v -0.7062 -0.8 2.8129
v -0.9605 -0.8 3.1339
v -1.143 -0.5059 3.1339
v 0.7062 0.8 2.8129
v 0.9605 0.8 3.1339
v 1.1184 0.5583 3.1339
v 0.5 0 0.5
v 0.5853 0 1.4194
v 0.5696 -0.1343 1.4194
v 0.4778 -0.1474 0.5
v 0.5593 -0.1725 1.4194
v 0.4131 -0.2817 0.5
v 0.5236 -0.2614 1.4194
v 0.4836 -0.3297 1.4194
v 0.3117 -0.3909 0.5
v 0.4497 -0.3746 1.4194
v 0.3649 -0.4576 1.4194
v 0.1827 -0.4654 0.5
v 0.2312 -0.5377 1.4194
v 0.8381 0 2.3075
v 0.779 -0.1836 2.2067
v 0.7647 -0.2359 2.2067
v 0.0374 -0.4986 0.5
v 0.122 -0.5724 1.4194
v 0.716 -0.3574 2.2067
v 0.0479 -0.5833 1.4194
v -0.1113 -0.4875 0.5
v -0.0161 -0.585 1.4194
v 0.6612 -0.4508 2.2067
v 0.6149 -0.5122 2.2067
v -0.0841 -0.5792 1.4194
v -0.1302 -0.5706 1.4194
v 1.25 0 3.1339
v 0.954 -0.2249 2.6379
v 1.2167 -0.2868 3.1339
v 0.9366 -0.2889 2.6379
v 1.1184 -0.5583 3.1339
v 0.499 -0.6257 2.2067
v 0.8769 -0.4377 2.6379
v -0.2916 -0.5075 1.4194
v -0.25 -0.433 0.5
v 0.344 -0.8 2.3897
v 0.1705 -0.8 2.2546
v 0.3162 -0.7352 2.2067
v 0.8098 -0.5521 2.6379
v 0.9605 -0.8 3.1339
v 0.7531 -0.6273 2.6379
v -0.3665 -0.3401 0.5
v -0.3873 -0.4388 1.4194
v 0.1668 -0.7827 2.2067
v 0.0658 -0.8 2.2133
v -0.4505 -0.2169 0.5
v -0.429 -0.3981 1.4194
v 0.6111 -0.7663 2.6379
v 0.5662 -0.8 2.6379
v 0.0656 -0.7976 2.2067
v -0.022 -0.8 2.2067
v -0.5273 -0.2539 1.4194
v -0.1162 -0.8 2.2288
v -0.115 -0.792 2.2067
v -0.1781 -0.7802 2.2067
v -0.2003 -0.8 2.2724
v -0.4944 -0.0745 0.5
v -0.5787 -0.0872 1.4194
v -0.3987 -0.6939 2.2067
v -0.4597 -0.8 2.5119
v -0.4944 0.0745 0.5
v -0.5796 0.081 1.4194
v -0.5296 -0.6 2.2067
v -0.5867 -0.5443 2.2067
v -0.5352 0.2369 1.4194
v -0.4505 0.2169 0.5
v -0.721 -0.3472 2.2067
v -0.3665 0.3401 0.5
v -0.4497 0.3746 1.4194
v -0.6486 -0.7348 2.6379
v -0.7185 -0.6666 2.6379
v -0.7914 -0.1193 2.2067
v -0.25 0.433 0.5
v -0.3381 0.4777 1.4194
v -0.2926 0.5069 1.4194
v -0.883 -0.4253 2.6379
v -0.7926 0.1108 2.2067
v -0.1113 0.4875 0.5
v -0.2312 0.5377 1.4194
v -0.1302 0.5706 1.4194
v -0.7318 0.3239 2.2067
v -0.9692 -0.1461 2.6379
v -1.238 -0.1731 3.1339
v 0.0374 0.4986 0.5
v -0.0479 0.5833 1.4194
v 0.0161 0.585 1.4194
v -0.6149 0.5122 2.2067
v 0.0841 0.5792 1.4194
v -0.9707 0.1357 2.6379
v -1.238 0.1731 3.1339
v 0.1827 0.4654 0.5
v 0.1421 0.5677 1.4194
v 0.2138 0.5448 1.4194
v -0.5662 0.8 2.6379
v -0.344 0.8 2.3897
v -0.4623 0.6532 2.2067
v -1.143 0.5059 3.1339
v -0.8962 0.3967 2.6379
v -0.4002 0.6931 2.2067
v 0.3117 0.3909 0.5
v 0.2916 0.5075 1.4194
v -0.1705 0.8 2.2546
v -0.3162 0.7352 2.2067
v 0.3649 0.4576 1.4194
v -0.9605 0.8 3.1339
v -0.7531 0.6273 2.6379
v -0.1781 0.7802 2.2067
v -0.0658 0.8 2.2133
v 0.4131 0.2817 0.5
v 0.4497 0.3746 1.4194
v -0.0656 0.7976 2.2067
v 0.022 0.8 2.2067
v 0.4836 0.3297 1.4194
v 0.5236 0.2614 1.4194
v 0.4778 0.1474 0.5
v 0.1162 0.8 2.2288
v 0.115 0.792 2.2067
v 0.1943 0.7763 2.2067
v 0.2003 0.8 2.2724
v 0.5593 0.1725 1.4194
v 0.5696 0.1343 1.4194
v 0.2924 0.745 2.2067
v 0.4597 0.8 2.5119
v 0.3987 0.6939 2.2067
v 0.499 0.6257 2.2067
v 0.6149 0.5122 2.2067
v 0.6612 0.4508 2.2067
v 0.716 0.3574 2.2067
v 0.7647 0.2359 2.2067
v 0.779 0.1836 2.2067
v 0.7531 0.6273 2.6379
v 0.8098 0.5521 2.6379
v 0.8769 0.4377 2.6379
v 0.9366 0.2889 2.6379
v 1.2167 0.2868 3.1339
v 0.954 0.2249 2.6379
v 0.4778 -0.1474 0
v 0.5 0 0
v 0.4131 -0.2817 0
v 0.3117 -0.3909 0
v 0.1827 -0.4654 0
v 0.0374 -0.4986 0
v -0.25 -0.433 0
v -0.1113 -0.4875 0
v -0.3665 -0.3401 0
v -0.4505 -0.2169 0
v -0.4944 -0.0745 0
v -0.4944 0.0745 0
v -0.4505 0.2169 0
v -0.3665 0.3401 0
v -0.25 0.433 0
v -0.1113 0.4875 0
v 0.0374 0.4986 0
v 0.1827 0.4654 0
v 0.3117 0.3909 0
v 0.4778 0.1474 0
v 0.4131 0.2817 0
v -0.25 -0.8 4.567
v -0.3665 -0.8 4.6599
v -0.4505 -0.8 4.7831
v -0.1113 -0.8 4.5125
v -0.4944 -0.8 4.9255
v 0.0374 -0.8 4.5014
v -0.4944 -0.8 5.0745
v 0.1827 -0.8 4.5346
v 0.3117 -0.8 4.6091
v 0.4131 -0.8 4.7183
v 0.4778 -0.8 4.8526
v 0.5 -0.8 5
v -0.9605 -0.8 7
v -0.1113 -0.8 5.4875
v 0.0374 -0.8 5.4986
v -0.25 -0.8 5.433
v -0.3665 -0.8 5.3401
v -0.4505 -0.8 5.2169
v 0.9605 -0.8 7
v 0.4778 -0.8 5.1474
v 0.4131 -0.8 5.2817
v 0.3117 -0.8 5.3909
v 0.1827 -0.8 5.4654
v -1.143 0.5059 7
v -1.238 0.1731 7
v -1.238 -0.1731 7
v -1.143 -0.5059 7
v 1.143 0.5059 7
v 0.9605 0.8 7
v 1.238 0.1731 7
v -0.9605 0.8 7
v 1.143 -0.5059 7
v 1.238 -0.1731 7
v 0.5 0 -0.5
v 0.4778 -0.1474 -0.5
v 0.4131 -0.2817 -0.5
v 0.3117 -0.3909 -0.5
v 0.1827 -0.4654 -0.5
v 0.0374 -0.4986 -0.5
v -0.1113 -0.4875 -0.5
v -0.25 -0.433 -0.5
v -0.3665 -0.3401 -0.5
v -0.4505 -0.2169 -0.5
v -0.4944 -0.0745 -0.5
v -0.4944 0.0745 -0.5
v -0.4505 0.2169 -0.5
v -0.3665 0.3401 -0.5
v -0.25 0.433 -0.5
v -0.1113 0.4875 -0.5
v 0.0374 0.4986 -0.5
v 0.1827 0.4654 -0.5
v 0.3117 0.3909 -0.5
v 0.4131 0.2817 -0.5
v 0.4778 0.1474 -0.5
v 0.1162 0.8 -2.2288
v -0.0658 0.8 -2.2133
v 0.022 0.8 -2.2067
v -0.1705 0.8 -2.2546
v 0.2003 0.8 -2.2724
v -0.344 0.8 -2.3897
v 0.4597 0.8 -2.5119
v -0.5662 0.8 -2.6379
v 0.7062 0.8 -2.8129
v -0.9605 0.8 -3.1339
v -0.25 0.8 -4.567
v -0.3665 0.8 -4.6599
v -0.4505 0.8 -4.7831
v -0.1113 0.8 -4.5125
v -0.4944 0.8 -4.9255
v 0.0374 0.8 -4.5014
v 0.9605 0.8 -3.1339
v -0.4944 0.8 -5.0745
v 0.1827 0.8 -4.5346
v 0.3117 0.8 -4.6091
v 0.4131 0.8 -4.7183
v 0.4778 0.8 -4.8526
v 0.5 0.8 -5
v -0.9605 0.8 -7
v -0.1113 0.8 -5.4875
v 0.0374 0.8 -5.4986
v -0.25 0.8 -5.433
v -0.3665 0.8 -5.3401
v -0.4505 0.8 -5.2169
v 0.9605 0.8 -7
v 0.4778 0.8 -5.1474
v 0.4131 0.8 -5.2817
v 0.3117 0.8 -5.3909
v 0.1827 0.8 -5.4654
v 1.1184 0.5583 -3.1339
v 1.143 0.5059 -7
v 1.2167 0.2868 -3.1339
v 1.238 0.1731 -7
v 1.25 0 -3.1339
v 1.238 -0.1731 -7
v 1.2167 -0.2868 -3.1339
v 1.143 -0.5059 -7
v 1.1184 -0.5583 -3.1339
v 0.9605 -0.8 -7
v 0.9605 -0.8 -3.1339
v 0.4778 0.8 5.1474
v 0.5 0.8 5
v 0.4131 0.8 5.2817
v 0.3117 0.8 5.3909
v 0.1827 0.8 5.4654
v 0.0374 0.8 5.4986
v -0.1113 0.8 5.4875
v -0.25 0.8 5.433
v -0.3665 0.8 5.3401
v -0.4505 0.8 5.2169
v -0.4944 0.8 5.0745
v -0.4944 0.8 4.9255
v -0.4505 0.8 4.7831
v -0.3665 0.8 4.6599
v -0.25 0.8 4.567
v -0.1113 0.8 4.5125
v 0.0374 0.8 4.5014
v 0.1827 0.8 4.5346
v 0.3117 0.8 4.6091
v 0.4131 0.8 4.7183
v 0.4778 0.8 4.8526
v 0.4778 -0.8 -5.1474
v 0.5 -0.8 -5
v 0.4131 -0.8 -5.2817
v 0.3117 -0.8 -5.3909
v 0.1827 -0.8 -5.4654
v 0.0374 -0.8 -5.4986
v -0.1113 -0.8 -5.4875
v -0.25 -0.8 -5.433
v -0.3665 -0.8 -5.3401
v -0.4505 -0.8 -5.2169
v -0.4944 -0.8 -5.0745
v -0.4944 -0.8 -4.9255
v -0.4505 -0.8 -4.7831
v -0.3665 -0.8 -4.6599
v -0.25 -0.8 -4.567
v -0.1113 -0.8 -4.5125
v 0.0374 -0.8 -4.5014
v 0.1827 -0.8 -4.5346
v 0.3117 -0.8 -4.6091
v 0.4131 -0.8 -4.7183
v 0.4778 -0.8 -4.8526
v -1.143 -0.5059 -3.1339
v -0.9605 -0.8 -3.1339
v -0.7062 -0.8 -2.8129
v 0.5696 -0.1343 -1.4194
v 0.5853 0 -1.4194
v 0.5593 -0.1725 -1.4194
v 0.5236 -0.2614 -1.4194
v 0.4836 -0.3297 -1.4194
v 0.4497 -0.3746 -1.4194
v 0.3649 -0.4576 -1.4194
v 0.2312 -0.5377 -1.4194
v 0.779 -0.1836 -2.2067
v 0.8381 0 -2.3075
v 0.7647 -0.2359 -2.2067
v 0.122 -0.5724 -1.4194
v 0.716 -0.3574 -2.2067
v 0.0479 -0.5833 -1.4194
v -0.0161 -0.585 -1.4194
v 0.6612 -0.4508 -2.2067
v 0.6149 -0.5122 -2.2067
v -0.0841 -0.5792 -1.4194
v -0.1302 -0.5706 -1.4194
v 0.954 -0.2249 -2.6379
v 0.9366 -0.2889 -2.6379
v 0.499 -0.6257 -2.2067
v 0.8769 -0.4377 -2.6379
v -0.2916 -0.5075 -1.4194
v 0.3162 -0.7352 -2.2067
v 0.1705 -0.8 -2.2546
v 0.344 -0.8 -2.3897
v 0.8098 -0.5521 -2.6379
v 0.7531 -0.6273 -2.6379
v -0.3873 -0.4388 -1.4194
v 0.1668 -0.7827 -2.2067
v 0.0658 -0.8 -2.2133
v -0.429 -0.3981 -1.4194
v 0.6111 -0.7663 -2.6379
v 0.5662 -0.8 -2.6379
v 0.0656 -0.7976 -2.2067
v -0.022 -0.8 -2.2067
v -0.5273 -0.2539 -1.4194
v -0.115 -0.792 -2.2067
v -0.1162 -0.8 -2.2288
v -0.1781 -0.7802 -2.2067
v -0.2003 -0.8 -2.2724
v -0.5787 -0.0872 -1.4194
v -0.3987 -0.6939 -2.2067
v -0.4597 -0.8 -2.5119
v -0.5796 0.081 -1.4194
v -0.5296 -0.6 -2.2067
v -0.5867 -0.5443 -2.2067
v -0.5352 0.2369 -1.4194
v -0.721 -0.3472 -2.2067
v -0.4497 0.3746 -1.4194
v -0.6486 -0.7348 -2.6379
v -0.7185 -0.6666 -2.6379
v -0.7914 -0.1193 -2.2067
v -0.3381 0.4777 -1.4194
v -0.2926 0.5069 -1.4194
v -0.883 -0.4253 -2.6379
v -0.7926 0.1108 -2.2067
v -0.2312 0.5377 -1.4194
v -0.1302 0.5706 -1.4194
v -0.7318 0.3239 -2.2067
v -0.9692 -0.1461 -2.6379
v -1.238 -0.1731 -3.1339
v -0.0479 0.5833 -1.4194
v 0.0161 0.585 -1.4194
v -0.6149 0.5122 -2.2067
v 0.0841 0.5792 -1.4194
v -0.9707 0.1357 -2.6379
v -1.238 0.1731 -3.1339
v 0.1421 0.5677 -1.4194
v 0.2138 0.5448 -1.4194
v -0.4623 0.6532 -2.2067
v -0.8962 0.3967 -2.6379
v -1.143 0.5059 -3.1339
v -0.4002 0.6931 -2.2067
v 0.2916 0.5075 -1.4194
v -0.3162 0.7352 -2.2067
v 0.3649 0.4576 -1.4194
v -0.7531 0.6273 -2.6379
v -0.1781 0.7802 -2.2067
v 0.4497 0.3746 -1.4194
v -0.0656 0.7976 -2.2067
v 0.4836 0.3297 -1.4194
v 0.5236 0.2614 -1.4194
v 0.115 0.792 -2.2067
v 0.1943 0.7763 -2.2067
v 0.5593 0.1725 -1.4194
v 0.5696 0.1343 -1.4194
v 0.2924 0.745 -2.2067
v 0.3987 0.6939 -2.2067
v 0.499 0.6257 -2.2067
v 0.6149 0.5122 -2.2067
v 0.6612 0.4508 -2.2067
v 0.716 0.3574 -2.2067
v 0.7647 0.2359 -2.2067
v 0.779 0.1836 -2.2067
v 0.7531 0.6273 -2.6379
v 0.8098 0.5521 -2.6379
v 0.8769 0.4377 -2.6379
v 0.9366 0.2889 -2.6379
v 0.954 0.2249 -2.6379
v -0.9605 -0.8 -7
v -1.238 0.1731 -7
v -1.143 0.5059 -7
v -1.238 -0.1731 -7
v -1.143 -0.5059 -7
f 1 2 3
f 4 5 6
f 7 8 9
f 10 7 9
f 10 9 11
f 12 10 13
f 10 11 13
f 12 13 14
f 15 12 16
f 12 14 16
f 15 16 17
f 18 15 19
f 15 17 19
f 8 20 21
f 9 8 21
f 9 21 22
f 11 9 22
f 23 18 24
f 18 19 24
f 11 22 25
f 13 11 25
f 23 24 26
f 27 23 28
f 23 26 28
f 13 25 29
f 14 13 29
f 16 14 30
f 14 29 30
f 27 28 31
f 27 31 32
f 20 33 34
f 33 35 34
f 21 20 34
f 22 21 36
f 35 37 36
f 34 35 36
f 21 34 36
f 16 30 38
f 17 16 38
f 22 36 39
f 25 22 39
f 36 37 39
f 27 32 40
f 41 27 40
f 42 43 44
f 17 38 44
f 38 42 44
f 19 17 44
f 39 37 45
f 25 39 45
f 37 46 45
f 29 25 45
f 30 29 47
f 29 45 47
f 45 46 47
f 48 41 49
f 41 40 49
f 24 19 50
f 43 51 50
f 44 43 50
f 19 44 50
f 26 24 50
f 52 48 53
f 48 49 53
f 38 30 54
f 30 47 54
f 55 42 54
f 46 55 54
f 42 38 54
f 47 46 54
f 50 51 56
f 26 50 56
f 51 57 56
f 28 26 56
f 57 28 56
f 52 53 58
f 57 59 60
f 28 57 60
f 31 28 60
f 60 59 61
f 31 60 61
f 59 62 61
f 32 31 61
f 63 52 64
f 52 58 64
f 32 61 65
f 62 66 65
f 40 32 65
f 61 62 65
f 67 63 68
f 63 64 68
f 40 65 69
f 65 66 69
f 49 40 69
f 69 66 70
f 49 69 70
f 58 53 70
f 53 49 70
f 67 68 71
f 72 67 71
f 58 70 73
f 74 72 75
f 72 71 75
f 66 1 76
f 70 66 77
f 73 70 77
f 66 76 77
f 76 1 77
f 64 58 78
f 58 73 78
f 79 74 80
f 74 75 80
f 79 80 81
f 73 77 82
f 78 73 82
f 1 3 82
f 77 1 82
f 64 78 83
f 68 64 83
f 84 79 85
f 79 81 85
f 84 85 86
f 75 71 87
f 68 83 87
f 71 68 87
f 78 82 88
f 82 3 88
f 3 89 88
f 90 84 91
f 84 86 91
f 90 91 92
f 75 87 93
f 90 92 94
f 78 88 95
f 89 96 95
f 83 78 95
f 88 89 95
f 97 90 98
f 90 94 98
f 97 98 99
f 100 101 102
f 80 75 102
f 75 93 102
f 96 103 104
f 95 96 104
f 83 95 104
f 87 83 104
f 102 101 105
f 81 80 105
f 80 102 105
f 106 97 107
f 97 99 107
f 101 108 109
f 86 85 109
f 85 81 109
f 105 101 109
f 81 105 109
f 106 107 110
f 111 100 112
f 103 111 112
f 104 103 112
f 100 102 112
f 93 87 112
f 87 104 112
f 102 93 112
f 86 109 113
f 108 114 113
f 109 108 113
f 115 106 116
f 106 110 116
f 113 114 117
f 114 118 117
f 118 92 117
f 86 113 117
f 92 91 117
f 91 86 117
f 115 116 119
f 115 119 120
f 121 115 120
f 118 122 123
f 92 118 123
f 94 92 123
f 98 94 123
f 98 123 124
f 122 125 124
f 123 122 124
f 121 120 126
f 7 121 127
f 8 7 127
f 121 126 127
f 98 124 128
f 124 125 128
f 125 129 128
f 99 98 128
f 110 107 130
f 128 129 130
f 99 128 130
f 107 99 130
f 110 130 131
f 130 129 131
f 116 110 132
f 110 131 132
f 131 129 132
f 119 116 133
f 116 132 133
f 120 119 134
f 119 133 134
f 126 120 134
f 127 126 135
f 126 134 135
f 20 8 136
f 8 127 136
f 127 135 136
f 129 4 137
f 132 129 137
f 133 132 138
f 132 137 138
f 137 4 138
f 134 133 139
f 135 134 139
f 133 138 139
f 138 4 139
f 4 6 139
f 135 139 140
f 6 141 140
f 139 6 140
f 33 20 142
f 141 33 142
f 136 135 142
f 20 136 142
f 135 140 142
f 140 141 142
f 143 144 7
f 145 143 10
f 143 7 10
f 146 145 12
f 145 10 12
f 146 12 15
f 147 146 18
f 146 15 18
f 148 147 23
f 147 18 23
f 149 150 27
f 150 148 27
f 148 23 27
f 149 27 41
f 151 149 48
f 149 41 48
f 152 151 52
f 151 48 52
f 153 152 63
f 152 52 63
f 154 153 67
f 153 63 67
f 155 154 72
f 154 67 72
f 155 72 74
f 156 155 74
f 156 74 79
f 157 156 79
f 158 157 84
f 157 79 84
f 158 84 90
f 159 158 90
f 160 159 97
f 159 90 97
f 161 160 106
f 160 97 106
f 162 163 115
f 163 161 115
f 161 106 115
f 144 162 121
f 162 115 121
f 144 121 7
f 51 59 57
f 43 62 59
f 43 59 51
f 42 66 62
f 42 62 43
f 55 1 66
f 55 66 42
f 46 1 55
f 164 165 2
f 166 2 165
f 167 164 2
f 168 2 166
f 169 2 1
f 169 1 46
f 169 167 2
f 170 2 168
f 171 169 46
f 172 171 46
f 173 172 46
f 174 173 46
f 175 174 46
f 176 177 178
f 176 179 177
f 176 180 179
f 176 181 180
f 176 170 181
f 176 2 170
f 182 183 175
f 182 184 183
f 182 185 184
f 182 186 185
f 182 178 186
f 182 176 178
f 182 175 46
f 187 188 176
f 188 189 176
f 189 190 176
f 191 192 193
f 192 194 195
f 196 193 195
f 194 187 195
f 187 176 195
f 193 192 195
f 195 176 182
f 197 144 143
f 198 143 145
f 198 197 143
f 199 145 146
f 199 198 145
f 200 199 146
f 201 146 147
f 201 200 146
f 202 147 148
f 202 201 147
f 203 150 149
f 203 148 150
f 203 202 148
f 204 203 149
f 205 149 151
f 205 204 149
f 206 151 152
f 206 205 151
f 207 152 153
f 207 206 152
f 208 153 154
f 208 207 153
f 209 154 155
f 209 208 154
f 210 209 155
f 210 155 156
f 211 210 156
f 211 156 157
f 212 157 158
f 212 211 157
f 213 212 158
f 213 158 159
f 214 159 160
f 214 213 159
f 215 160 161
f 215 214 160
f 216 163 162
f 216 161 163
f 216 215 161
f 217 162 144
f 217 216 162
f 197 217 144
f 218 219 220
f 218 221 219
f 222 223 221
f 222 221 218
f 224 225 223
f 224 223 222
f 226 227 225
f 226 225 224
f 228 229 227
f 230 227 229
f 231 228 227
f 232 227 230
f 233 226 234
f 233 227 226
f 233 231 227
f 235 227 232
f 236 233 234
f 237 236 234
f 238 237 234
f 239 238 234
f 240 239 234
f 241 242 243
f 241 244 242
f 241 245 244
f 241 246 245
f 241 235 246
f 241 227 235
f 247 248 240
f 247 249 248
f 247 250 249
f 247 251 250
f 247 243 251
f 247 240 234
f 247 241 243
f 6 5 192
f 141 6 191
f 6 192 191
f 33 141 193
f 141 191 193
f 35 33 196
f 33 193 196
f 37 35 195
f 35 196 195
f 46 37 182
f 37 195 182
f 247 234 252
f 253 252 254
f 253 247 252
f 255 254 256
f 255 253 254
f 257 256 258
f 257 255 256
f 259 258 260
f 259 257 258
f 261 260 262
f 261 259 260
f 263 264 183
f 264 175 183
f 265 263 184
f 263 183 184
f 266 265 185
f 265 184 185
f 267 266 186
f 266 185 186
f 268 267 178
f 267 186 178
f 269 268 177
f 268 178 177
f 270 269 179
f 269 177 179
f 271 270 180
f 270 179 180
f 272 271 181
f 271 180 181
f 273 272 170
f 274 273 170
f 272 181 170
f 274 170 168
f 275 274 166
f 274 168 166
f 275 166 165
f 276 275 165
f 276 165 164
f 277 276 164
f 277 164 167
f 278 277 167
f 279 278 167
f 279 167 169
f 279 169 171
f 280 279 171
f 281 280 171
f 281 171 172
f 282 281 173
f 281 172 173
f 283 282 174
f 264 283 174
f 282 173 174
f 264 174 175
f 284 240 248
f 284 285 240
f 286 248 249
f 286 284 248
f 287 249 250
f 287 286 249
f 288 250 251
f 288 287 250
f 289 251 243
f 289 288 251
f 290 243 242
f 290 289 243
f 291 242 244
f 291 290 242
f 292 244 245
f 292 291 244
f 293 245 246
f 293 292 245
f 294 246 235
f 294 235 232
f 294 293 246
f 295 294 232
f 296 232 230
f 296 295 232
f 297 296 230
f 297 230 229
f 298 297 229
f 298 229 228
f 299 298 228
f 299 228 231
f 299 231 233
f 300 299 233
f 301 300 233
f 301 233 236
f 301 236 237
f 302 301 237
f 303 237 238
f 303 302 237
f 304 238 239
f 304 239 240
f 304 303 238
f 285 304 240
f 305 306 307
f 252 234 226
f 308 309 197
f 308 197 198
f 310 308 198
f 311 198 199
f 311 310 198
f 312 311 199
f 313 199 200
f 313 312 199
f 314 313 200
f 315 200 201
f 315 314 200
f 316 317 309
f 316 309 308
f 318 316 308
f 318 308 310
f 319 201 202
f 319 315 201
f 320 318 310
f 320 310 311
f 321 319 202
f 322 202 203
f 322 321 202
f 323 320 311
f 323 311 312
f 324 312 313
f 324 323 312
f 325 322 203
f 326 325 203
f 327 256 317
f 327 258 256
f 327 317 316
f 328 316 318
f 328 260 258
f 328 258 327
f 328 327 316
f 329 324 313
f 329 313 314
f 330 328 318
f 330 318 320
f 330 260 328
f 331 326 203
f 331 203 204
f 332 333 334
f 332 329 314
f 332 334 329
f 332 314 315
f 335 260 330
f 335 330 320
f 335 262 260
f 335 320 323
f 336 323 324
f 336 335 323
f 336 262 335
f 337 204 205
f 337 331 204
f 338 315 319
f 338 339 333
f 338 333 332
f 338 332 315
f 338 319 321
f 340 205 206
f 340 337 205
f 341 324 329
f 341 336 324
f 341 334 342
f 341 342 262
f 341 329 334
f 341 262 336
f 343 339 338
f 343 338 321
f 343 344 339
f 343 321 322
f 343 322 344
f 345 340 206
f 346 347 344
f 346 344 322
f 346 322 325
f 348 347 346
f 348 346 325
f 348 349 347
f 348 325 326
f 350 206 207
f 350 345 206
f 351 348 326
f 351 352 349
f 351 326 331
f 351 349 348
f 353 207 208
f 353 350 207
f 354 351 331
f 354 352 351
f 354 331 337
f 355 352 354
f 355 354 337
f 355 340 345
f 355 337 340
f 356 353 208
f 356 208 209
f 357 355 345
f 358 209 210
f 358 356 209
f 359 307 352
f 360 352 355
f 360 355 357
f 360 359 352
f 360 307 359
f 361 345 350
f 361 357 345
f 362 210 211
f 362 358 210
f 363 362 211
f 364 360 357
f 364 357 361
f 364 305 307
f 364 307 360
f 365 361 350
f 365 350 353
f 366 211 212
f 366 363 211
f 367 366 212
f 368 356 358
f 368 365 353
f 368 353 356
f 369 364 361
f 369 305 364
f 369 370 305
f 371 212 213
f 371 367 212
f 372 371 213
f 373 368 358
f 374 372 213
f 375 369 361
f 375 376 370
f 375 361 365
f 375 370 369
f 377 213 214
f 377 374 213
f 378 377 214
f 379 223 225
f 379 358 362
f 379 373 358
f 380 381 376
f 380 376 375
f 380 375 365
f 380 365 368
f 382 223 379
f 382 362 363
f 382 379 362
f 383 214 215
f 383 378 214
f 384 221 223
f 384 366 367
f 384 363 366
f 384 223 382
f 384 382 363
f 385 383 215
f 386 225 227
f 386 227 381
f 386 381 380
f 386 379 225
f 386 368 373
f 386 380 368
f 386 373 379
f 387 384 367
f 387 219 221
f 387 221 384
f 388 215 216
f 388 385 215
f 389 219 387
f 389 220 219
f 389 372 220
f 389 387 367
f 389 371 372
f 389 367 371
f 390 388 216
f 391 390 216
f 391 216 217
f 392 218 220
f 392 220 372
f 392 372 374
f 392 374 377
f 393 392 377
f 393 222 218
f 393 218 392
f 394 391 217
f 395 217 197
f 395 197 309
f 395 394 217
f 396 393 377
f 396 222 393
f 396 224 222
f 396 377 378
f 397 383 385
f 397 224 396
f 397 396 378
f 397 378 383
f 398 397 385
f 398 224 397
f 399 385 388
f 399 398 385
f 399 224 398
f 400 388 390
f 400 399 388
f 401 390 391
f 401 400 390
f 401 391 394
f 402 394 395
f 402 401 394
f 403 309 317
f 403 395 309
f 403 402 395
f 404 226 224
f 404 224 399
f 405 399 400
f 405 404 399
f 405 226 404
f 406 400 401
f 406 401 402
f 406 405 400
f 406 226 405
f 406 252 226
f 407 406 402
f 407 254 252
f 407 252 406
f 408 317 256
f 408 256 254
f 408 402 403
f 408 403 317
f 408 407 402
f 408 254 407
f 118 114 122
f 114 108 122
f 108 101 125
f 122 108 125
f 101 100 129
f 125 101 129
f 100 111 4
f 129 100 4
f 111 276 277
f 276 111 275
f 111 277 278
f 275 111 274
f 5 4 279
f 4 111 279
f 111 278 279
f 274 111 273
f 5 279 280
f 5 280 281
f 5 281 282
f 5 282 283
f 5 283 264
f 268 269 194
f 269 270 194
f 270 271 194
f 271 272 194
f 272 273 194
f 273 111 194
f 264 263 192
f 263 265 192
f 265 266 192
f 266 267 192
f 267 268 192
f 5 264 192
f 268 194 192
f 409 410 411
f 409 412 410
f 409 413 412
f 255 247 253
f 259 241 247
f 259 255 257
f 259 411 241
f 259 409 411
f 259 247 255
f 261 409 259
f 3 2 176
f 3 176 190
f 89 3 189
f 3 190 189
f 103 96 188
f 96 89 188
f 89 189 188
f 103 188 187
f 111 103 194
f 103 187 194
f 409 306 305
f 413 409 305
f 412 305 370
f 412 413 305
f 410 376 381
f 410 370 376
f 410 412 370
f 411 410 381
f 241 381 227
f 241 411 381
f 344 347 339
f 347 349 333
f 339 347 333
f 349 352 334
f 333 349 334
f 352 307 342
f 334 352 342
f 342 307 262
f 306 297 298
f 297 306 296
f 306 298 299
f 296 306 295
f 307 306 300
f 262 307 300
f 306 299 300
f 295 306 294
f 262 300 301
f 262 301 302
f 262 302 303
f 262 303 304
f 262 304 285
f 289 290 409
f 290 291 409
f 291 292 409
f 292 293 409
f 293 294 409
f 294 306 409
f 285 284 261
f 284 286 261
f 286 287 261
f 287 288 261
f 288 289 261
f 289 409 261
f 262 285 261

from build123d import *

# Parameters (mm, degrees)
F2_W     = 1.25
F2_H     = 7
F3_DEPTH = 0.8
F4_R     = 0.5
F5_DEPTH = 12.5


# Not quite as in the source:
# - a feature names something its author has since deleted; it is built from what else it names


with BuildPart() as f1:
    # F0 (on Front) → F1 (revolve)
    with BuildSketch(Plane.XZ):
        with BuildLine():
            Line((1.25, 7), (0, 7))
            Line((0, 7), (0, 0))
            Line((0, 0), (0, -7))
            Line((0, -7), (1.25, -7))
            Line((1.25, -7), (1.25, -3.1339134382))
            ThreePointArc((1.25, -3.1339134382), (0.6911539846, -1.8693063938), (0.5, -0.5))
            Line((0.5, -0.5), (0.5, 0.5))
            ThreePointArc((0.5, 0.5), (0.6911539846, 1.8693063938), (1.25, 3.1339134382))
            Line((1.25, 3.1339134382), (1.25, 7))
        make_face()
    revolve(axis=Axis((0, 0, 3.5), (0, 0, -1)))

    # F2 (on Front) → F3 (intersect, symmetric)
    with BuildSketch(Plane.XZ):
        with Locations((0.625, 3.5)):
            Rectangle(F2_W, F2_H)
        with Locations((-0.625, 3.5)):
            Rectangle(F2_W, F2_H)
    extrude(amount=F3_DEPTH, both=True, mode=Mode.INTERSECT)

    # F4 (on Front) → F5 (cut, symmetric)
    with BuildSketch(Plane.XZ):
        with Locations((0, 5)):
            Circle(F4_R)
    extrude(amount=F5_DEPTH, both=True, mode=Mode.SUBTRACT)

    # F6: F1 across plane


with BuildPart() as f1_1:
    add(f1.part)
    add(f1.part.mirror(Plane.XY))


solid = f1_1.part
